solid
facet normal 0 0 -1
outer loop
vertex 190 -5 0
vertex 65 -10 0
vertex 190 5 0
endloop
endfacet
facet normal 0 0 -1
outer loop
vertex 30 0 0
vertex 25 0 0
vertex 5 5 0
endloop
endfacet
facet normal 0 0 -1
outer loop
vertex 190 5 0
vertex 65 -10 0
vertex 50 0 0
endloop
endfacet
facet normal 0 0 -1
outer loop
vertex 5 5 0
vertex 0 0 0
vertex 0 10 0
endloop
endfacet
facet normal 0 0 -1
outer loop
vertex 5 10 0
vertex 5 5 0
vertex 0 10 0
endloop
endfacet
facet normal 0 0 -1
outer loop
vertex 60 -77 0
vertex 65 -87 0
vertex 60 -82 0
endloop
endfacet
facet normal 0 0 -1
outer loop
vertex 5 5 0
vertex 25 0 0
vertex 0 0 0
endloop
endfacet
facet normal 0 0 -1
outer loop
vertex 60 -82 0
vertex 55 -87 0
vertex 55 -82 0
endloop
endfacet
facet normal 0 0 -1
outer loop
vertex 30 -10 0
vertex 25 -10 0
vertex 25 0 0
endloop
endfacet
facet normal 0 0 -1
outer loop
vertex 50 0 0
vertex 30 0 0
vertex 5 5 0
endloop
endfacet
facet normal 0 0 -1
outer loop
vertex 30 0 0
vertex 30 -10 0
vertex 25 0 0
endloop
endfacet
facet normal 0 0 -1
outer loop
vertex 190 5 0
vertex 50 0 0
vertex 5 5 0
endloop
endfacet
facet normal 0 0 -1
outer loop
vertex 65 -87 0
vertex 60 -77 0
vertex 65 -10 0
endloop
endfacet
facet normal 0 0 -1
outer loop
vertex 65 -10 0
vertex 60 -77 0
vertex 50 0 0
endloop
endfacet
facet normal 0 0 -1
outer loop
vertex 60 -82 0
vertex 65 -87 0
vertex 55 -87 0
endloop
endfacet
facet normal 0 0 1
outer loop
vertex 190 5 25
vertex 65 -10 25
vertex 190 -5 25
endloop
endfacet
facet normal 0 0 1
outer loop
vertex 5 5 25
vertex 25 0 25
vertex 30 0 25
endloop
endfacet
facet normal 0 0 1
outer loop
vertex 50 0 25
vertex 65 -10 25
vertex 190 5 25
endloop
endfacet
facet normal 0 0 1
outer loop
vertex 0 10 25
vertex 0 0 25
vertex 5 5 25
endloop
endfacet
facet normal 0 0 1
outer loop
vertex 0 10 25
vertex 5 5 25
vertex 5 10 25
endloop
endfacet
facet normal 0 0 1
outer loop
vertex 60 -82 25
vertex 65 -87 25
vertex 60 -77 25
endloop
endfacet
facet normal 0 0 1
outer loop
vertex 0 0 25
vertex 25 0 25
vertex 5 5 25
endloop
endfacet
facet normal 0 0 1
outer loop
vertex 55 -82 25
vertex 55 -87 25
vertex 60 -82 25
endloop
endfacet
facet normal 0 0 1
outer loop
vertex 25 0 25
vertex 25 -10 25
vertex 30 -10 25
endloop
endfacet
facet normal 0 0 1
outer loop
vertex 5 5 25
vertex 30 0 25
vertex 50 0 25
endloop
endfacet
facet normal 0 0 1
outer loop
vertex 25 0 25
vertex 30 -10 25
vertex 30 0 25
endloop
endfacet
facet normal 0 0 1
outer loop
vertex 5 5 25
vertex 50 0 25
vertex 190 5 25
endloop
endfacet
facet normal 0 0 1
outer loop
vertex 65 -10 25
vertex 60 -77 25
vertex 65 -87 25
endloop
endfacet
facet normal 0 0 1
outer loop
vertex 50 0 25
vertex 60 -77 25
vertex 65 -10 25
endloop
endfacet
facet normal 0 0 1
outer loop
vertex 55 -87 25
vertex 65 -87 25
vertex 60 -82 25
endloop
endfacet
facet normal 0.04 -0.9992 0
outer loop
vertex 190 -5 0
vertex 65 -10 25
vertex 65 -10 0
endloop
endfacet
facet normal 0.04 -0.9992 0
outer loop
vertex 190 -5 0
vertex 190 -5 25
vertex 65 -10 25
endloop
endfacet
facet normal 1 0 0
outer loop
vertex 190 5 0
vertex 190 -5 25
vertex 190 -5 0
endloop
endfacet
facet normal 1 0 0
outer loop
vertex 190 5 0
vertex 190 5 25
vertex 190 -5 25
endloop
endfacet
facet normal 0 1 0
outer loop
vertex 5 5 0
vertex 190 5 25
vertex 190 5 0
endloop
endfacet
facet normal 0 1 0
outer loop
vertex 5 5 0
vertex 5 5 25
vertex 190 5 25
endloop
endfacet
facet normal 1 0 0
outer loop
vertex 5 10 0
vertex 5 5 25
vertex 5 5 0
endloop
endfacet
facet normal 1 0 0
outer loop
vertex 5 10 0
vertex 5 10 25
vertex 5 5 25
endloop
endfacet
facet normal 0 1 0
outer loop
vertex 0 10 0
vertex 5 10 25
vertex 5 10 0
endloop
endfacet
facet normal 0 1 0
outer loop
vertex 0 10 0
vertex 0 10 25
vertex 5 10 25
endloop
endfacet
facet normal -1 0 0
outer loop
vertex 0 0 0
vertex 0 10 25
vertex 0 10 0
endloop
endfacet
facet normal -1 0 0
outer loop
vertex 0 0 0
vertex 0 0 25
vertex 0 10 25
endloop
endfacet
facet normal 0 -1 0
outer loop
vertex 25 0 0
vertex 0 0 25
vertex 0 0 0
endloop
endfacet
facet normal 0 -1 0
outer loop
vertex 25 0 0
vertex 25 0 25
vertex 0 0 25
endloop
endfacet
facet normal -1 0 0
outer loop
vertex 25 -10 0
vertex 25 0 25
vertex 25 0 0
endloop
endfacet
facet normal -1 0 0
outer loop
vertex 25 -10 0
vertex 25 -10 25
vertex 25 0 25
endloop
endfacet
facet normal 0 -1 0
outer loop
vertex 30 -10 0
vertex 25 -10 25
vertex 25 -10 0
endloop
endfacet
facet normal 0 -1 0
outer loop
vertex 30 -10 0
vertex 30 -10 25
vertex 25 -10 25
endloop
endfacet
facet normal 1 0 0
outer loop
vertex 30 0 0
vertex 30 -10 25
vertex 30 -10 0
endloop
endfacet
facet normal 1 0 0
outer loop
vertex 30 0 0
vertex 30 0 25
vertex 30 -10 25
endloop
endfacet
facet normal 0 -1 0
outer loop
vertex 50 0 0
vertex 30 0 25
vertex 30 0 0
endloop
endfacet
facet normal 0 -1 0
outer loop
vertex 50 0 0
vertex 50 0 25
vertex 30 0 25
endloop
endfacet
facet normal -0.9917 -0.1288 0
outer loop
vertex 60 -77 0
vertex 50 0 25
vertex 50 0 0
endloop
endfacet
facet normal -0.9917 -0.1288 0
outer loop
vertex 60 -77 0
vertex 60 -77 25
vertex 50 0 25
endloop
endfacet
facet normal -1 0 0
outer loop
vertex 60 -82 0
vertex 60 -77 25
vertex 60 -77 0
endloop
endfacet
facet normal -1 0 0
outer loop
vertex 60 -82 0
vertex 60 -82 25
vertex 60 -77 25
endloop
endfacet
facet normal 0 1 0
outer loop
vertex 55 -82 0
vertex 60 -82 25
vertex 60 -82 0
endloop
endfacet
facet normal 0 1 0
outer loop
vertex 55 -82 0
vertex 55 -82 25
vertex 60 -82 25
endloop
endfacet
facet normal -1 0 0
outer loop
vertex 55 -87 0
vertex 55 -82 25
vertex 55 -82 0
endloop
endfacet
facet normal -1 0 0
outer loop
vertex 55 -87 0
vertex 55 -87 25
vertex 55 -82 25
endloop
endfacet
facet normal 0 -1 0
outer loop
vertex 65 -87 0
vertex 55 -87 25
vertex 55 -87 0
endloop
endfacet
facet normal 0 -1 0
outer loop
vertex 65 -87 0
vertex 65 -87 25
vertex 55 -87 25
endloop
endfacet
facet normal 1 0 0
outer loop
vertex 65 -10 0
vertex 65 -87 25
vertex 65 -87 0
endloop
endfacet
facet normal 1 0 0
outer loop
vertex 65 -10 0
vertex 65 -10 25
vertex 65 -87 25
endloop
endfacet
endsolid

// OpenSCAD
// file: rounded_rect.scad
// module for a rounded rectangle
// 14.11.2025
// Sebastian Weigl

module rr(l, w, r, h)
{
linear_extrude(height = h, center = false, convexity = 0)
  translate([r, r, 0])
  offset(r=r, $fn = 60) 
  square([l-(2*r), w-(2*r)]);
}

// to use this add
// use <rounded_rect.scad>
// and 
// rr(x_length,y_length,radius,height);
// main file
// over tv stand
// version 8
// 06.09.2026 Sebastian Weigl

// rr(x_length,y_length,radius,height);
$fn=64;
include <rounded_rect.scad>

// main body
  // outer body
  
linear_extrude(height=25, scale=[1,1], slices=0, twist=0)
polygon(points=[[0,0],[25,0],[25,-10],[30,-10],[30,0],[50,0],[60,-77],[60,-82],[55,-82],[55,-87],[65,-87],[65,-10],[190,-5],[190,5],[5,5],[5,10],[0,10],[0,0]]);
 
